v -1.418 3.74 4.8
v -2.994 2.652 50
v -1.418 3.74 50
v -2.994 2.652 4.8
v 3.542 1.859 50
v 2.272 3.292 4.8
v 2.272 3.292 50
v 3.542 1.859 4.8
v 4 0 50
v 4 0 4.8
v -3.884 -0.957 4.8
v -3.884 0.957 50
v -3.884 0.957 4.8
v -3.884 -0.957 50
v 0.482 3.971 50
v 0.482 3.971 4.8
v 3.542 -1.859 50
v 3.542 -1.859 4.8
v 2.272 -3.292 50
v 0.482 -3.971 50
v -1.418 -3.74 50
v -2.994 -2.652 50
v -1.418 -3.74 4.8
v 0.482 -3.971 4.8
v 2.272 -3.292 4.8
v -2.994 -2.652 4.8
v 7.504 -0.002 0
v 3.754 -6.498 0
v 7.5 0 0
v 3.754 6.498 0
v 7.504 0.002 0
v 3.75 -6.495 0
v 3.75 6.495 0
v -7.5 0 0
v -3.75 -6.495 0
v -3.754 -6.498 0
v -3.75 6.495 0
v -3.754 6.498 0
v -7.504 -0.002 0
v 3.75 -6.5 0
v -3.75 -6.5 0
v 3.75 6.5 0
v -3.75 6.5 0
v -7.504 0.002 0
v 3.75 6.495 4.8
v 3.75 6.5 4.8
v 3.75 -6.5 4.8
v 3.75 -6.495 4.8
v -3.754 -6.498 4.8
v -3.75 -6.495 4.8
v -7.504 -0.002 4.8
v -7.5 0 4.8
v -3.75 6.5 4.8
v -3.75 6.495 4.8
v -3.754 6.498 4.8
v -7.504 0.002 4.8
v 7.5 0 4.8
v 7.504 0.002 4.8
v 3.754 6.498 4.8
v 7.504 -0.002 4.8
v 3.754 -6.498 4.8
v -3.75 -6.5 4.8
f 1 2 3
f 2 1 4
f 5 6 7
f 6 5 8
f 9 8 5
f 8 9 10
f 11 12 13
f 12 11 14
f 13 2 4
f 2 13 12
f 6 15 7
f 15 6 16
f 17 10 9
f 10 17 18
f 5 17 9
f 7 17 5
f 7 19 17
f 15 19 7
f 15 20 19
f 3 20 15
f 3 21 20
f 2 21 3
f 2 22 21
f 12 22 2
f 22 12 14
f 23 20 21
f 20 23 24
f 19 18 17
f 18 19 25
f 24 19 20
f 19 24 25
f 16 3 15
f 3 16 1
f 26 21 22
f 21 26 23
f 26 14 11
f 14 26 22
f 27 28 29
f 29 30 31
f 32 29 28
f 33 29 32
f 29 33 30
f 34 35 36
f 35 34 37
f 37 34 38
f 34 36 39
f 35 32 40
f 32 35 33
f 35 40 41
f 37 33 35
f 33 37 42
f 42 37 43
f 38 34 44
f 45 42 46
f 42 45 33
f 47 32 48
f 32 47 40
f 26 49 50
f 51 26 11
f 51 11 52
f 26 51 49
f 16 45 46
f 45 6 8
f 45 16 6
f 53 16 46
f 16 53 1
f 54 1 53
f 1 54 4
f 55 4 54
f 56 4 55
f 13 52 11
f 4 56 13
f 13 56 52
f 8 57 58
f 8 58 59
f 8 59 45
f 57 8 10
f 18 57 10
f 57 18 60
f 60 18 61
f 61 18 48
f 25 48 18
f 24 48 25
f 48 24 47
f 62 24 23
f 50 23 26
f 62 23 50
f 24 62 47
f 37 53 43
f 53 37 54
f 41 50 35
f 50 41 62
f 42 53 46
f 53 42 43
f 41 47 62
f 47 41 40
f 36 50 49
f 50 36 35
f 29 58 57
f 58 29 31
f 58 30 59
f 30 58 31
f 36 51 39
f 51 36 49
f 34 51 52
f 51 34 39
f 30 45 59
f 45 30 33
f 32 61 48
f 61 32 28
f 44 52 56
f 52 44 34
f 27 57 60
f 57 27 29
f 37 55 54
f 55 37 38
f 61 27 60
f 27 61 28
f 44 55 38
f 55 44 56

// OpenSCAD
//Hi I am Gibbedy :)
//This is my attempt to model an M8 bolt.
//In an effort to learn openscad and github I would like anyone 
//to simplify my code. Or just make changes for the sake of it so I can see
//how this github thing works.

module Bolt_50_mm_M8()
	{
	translate(0,0,4.8) cylinder(50,4,4);
	translate([-3.75,-6.5,0])cube([7.5,13,4.8]);
	rotate([0,0,120]) translate([-3.75,-6.5,0])cube([7.5,13,4.8]);
	rotate([0,0,240]) translate([-3.75,-6.5,0])cube([7.5,13,4.8]);
	}

Bolt_50_mm_M8();
